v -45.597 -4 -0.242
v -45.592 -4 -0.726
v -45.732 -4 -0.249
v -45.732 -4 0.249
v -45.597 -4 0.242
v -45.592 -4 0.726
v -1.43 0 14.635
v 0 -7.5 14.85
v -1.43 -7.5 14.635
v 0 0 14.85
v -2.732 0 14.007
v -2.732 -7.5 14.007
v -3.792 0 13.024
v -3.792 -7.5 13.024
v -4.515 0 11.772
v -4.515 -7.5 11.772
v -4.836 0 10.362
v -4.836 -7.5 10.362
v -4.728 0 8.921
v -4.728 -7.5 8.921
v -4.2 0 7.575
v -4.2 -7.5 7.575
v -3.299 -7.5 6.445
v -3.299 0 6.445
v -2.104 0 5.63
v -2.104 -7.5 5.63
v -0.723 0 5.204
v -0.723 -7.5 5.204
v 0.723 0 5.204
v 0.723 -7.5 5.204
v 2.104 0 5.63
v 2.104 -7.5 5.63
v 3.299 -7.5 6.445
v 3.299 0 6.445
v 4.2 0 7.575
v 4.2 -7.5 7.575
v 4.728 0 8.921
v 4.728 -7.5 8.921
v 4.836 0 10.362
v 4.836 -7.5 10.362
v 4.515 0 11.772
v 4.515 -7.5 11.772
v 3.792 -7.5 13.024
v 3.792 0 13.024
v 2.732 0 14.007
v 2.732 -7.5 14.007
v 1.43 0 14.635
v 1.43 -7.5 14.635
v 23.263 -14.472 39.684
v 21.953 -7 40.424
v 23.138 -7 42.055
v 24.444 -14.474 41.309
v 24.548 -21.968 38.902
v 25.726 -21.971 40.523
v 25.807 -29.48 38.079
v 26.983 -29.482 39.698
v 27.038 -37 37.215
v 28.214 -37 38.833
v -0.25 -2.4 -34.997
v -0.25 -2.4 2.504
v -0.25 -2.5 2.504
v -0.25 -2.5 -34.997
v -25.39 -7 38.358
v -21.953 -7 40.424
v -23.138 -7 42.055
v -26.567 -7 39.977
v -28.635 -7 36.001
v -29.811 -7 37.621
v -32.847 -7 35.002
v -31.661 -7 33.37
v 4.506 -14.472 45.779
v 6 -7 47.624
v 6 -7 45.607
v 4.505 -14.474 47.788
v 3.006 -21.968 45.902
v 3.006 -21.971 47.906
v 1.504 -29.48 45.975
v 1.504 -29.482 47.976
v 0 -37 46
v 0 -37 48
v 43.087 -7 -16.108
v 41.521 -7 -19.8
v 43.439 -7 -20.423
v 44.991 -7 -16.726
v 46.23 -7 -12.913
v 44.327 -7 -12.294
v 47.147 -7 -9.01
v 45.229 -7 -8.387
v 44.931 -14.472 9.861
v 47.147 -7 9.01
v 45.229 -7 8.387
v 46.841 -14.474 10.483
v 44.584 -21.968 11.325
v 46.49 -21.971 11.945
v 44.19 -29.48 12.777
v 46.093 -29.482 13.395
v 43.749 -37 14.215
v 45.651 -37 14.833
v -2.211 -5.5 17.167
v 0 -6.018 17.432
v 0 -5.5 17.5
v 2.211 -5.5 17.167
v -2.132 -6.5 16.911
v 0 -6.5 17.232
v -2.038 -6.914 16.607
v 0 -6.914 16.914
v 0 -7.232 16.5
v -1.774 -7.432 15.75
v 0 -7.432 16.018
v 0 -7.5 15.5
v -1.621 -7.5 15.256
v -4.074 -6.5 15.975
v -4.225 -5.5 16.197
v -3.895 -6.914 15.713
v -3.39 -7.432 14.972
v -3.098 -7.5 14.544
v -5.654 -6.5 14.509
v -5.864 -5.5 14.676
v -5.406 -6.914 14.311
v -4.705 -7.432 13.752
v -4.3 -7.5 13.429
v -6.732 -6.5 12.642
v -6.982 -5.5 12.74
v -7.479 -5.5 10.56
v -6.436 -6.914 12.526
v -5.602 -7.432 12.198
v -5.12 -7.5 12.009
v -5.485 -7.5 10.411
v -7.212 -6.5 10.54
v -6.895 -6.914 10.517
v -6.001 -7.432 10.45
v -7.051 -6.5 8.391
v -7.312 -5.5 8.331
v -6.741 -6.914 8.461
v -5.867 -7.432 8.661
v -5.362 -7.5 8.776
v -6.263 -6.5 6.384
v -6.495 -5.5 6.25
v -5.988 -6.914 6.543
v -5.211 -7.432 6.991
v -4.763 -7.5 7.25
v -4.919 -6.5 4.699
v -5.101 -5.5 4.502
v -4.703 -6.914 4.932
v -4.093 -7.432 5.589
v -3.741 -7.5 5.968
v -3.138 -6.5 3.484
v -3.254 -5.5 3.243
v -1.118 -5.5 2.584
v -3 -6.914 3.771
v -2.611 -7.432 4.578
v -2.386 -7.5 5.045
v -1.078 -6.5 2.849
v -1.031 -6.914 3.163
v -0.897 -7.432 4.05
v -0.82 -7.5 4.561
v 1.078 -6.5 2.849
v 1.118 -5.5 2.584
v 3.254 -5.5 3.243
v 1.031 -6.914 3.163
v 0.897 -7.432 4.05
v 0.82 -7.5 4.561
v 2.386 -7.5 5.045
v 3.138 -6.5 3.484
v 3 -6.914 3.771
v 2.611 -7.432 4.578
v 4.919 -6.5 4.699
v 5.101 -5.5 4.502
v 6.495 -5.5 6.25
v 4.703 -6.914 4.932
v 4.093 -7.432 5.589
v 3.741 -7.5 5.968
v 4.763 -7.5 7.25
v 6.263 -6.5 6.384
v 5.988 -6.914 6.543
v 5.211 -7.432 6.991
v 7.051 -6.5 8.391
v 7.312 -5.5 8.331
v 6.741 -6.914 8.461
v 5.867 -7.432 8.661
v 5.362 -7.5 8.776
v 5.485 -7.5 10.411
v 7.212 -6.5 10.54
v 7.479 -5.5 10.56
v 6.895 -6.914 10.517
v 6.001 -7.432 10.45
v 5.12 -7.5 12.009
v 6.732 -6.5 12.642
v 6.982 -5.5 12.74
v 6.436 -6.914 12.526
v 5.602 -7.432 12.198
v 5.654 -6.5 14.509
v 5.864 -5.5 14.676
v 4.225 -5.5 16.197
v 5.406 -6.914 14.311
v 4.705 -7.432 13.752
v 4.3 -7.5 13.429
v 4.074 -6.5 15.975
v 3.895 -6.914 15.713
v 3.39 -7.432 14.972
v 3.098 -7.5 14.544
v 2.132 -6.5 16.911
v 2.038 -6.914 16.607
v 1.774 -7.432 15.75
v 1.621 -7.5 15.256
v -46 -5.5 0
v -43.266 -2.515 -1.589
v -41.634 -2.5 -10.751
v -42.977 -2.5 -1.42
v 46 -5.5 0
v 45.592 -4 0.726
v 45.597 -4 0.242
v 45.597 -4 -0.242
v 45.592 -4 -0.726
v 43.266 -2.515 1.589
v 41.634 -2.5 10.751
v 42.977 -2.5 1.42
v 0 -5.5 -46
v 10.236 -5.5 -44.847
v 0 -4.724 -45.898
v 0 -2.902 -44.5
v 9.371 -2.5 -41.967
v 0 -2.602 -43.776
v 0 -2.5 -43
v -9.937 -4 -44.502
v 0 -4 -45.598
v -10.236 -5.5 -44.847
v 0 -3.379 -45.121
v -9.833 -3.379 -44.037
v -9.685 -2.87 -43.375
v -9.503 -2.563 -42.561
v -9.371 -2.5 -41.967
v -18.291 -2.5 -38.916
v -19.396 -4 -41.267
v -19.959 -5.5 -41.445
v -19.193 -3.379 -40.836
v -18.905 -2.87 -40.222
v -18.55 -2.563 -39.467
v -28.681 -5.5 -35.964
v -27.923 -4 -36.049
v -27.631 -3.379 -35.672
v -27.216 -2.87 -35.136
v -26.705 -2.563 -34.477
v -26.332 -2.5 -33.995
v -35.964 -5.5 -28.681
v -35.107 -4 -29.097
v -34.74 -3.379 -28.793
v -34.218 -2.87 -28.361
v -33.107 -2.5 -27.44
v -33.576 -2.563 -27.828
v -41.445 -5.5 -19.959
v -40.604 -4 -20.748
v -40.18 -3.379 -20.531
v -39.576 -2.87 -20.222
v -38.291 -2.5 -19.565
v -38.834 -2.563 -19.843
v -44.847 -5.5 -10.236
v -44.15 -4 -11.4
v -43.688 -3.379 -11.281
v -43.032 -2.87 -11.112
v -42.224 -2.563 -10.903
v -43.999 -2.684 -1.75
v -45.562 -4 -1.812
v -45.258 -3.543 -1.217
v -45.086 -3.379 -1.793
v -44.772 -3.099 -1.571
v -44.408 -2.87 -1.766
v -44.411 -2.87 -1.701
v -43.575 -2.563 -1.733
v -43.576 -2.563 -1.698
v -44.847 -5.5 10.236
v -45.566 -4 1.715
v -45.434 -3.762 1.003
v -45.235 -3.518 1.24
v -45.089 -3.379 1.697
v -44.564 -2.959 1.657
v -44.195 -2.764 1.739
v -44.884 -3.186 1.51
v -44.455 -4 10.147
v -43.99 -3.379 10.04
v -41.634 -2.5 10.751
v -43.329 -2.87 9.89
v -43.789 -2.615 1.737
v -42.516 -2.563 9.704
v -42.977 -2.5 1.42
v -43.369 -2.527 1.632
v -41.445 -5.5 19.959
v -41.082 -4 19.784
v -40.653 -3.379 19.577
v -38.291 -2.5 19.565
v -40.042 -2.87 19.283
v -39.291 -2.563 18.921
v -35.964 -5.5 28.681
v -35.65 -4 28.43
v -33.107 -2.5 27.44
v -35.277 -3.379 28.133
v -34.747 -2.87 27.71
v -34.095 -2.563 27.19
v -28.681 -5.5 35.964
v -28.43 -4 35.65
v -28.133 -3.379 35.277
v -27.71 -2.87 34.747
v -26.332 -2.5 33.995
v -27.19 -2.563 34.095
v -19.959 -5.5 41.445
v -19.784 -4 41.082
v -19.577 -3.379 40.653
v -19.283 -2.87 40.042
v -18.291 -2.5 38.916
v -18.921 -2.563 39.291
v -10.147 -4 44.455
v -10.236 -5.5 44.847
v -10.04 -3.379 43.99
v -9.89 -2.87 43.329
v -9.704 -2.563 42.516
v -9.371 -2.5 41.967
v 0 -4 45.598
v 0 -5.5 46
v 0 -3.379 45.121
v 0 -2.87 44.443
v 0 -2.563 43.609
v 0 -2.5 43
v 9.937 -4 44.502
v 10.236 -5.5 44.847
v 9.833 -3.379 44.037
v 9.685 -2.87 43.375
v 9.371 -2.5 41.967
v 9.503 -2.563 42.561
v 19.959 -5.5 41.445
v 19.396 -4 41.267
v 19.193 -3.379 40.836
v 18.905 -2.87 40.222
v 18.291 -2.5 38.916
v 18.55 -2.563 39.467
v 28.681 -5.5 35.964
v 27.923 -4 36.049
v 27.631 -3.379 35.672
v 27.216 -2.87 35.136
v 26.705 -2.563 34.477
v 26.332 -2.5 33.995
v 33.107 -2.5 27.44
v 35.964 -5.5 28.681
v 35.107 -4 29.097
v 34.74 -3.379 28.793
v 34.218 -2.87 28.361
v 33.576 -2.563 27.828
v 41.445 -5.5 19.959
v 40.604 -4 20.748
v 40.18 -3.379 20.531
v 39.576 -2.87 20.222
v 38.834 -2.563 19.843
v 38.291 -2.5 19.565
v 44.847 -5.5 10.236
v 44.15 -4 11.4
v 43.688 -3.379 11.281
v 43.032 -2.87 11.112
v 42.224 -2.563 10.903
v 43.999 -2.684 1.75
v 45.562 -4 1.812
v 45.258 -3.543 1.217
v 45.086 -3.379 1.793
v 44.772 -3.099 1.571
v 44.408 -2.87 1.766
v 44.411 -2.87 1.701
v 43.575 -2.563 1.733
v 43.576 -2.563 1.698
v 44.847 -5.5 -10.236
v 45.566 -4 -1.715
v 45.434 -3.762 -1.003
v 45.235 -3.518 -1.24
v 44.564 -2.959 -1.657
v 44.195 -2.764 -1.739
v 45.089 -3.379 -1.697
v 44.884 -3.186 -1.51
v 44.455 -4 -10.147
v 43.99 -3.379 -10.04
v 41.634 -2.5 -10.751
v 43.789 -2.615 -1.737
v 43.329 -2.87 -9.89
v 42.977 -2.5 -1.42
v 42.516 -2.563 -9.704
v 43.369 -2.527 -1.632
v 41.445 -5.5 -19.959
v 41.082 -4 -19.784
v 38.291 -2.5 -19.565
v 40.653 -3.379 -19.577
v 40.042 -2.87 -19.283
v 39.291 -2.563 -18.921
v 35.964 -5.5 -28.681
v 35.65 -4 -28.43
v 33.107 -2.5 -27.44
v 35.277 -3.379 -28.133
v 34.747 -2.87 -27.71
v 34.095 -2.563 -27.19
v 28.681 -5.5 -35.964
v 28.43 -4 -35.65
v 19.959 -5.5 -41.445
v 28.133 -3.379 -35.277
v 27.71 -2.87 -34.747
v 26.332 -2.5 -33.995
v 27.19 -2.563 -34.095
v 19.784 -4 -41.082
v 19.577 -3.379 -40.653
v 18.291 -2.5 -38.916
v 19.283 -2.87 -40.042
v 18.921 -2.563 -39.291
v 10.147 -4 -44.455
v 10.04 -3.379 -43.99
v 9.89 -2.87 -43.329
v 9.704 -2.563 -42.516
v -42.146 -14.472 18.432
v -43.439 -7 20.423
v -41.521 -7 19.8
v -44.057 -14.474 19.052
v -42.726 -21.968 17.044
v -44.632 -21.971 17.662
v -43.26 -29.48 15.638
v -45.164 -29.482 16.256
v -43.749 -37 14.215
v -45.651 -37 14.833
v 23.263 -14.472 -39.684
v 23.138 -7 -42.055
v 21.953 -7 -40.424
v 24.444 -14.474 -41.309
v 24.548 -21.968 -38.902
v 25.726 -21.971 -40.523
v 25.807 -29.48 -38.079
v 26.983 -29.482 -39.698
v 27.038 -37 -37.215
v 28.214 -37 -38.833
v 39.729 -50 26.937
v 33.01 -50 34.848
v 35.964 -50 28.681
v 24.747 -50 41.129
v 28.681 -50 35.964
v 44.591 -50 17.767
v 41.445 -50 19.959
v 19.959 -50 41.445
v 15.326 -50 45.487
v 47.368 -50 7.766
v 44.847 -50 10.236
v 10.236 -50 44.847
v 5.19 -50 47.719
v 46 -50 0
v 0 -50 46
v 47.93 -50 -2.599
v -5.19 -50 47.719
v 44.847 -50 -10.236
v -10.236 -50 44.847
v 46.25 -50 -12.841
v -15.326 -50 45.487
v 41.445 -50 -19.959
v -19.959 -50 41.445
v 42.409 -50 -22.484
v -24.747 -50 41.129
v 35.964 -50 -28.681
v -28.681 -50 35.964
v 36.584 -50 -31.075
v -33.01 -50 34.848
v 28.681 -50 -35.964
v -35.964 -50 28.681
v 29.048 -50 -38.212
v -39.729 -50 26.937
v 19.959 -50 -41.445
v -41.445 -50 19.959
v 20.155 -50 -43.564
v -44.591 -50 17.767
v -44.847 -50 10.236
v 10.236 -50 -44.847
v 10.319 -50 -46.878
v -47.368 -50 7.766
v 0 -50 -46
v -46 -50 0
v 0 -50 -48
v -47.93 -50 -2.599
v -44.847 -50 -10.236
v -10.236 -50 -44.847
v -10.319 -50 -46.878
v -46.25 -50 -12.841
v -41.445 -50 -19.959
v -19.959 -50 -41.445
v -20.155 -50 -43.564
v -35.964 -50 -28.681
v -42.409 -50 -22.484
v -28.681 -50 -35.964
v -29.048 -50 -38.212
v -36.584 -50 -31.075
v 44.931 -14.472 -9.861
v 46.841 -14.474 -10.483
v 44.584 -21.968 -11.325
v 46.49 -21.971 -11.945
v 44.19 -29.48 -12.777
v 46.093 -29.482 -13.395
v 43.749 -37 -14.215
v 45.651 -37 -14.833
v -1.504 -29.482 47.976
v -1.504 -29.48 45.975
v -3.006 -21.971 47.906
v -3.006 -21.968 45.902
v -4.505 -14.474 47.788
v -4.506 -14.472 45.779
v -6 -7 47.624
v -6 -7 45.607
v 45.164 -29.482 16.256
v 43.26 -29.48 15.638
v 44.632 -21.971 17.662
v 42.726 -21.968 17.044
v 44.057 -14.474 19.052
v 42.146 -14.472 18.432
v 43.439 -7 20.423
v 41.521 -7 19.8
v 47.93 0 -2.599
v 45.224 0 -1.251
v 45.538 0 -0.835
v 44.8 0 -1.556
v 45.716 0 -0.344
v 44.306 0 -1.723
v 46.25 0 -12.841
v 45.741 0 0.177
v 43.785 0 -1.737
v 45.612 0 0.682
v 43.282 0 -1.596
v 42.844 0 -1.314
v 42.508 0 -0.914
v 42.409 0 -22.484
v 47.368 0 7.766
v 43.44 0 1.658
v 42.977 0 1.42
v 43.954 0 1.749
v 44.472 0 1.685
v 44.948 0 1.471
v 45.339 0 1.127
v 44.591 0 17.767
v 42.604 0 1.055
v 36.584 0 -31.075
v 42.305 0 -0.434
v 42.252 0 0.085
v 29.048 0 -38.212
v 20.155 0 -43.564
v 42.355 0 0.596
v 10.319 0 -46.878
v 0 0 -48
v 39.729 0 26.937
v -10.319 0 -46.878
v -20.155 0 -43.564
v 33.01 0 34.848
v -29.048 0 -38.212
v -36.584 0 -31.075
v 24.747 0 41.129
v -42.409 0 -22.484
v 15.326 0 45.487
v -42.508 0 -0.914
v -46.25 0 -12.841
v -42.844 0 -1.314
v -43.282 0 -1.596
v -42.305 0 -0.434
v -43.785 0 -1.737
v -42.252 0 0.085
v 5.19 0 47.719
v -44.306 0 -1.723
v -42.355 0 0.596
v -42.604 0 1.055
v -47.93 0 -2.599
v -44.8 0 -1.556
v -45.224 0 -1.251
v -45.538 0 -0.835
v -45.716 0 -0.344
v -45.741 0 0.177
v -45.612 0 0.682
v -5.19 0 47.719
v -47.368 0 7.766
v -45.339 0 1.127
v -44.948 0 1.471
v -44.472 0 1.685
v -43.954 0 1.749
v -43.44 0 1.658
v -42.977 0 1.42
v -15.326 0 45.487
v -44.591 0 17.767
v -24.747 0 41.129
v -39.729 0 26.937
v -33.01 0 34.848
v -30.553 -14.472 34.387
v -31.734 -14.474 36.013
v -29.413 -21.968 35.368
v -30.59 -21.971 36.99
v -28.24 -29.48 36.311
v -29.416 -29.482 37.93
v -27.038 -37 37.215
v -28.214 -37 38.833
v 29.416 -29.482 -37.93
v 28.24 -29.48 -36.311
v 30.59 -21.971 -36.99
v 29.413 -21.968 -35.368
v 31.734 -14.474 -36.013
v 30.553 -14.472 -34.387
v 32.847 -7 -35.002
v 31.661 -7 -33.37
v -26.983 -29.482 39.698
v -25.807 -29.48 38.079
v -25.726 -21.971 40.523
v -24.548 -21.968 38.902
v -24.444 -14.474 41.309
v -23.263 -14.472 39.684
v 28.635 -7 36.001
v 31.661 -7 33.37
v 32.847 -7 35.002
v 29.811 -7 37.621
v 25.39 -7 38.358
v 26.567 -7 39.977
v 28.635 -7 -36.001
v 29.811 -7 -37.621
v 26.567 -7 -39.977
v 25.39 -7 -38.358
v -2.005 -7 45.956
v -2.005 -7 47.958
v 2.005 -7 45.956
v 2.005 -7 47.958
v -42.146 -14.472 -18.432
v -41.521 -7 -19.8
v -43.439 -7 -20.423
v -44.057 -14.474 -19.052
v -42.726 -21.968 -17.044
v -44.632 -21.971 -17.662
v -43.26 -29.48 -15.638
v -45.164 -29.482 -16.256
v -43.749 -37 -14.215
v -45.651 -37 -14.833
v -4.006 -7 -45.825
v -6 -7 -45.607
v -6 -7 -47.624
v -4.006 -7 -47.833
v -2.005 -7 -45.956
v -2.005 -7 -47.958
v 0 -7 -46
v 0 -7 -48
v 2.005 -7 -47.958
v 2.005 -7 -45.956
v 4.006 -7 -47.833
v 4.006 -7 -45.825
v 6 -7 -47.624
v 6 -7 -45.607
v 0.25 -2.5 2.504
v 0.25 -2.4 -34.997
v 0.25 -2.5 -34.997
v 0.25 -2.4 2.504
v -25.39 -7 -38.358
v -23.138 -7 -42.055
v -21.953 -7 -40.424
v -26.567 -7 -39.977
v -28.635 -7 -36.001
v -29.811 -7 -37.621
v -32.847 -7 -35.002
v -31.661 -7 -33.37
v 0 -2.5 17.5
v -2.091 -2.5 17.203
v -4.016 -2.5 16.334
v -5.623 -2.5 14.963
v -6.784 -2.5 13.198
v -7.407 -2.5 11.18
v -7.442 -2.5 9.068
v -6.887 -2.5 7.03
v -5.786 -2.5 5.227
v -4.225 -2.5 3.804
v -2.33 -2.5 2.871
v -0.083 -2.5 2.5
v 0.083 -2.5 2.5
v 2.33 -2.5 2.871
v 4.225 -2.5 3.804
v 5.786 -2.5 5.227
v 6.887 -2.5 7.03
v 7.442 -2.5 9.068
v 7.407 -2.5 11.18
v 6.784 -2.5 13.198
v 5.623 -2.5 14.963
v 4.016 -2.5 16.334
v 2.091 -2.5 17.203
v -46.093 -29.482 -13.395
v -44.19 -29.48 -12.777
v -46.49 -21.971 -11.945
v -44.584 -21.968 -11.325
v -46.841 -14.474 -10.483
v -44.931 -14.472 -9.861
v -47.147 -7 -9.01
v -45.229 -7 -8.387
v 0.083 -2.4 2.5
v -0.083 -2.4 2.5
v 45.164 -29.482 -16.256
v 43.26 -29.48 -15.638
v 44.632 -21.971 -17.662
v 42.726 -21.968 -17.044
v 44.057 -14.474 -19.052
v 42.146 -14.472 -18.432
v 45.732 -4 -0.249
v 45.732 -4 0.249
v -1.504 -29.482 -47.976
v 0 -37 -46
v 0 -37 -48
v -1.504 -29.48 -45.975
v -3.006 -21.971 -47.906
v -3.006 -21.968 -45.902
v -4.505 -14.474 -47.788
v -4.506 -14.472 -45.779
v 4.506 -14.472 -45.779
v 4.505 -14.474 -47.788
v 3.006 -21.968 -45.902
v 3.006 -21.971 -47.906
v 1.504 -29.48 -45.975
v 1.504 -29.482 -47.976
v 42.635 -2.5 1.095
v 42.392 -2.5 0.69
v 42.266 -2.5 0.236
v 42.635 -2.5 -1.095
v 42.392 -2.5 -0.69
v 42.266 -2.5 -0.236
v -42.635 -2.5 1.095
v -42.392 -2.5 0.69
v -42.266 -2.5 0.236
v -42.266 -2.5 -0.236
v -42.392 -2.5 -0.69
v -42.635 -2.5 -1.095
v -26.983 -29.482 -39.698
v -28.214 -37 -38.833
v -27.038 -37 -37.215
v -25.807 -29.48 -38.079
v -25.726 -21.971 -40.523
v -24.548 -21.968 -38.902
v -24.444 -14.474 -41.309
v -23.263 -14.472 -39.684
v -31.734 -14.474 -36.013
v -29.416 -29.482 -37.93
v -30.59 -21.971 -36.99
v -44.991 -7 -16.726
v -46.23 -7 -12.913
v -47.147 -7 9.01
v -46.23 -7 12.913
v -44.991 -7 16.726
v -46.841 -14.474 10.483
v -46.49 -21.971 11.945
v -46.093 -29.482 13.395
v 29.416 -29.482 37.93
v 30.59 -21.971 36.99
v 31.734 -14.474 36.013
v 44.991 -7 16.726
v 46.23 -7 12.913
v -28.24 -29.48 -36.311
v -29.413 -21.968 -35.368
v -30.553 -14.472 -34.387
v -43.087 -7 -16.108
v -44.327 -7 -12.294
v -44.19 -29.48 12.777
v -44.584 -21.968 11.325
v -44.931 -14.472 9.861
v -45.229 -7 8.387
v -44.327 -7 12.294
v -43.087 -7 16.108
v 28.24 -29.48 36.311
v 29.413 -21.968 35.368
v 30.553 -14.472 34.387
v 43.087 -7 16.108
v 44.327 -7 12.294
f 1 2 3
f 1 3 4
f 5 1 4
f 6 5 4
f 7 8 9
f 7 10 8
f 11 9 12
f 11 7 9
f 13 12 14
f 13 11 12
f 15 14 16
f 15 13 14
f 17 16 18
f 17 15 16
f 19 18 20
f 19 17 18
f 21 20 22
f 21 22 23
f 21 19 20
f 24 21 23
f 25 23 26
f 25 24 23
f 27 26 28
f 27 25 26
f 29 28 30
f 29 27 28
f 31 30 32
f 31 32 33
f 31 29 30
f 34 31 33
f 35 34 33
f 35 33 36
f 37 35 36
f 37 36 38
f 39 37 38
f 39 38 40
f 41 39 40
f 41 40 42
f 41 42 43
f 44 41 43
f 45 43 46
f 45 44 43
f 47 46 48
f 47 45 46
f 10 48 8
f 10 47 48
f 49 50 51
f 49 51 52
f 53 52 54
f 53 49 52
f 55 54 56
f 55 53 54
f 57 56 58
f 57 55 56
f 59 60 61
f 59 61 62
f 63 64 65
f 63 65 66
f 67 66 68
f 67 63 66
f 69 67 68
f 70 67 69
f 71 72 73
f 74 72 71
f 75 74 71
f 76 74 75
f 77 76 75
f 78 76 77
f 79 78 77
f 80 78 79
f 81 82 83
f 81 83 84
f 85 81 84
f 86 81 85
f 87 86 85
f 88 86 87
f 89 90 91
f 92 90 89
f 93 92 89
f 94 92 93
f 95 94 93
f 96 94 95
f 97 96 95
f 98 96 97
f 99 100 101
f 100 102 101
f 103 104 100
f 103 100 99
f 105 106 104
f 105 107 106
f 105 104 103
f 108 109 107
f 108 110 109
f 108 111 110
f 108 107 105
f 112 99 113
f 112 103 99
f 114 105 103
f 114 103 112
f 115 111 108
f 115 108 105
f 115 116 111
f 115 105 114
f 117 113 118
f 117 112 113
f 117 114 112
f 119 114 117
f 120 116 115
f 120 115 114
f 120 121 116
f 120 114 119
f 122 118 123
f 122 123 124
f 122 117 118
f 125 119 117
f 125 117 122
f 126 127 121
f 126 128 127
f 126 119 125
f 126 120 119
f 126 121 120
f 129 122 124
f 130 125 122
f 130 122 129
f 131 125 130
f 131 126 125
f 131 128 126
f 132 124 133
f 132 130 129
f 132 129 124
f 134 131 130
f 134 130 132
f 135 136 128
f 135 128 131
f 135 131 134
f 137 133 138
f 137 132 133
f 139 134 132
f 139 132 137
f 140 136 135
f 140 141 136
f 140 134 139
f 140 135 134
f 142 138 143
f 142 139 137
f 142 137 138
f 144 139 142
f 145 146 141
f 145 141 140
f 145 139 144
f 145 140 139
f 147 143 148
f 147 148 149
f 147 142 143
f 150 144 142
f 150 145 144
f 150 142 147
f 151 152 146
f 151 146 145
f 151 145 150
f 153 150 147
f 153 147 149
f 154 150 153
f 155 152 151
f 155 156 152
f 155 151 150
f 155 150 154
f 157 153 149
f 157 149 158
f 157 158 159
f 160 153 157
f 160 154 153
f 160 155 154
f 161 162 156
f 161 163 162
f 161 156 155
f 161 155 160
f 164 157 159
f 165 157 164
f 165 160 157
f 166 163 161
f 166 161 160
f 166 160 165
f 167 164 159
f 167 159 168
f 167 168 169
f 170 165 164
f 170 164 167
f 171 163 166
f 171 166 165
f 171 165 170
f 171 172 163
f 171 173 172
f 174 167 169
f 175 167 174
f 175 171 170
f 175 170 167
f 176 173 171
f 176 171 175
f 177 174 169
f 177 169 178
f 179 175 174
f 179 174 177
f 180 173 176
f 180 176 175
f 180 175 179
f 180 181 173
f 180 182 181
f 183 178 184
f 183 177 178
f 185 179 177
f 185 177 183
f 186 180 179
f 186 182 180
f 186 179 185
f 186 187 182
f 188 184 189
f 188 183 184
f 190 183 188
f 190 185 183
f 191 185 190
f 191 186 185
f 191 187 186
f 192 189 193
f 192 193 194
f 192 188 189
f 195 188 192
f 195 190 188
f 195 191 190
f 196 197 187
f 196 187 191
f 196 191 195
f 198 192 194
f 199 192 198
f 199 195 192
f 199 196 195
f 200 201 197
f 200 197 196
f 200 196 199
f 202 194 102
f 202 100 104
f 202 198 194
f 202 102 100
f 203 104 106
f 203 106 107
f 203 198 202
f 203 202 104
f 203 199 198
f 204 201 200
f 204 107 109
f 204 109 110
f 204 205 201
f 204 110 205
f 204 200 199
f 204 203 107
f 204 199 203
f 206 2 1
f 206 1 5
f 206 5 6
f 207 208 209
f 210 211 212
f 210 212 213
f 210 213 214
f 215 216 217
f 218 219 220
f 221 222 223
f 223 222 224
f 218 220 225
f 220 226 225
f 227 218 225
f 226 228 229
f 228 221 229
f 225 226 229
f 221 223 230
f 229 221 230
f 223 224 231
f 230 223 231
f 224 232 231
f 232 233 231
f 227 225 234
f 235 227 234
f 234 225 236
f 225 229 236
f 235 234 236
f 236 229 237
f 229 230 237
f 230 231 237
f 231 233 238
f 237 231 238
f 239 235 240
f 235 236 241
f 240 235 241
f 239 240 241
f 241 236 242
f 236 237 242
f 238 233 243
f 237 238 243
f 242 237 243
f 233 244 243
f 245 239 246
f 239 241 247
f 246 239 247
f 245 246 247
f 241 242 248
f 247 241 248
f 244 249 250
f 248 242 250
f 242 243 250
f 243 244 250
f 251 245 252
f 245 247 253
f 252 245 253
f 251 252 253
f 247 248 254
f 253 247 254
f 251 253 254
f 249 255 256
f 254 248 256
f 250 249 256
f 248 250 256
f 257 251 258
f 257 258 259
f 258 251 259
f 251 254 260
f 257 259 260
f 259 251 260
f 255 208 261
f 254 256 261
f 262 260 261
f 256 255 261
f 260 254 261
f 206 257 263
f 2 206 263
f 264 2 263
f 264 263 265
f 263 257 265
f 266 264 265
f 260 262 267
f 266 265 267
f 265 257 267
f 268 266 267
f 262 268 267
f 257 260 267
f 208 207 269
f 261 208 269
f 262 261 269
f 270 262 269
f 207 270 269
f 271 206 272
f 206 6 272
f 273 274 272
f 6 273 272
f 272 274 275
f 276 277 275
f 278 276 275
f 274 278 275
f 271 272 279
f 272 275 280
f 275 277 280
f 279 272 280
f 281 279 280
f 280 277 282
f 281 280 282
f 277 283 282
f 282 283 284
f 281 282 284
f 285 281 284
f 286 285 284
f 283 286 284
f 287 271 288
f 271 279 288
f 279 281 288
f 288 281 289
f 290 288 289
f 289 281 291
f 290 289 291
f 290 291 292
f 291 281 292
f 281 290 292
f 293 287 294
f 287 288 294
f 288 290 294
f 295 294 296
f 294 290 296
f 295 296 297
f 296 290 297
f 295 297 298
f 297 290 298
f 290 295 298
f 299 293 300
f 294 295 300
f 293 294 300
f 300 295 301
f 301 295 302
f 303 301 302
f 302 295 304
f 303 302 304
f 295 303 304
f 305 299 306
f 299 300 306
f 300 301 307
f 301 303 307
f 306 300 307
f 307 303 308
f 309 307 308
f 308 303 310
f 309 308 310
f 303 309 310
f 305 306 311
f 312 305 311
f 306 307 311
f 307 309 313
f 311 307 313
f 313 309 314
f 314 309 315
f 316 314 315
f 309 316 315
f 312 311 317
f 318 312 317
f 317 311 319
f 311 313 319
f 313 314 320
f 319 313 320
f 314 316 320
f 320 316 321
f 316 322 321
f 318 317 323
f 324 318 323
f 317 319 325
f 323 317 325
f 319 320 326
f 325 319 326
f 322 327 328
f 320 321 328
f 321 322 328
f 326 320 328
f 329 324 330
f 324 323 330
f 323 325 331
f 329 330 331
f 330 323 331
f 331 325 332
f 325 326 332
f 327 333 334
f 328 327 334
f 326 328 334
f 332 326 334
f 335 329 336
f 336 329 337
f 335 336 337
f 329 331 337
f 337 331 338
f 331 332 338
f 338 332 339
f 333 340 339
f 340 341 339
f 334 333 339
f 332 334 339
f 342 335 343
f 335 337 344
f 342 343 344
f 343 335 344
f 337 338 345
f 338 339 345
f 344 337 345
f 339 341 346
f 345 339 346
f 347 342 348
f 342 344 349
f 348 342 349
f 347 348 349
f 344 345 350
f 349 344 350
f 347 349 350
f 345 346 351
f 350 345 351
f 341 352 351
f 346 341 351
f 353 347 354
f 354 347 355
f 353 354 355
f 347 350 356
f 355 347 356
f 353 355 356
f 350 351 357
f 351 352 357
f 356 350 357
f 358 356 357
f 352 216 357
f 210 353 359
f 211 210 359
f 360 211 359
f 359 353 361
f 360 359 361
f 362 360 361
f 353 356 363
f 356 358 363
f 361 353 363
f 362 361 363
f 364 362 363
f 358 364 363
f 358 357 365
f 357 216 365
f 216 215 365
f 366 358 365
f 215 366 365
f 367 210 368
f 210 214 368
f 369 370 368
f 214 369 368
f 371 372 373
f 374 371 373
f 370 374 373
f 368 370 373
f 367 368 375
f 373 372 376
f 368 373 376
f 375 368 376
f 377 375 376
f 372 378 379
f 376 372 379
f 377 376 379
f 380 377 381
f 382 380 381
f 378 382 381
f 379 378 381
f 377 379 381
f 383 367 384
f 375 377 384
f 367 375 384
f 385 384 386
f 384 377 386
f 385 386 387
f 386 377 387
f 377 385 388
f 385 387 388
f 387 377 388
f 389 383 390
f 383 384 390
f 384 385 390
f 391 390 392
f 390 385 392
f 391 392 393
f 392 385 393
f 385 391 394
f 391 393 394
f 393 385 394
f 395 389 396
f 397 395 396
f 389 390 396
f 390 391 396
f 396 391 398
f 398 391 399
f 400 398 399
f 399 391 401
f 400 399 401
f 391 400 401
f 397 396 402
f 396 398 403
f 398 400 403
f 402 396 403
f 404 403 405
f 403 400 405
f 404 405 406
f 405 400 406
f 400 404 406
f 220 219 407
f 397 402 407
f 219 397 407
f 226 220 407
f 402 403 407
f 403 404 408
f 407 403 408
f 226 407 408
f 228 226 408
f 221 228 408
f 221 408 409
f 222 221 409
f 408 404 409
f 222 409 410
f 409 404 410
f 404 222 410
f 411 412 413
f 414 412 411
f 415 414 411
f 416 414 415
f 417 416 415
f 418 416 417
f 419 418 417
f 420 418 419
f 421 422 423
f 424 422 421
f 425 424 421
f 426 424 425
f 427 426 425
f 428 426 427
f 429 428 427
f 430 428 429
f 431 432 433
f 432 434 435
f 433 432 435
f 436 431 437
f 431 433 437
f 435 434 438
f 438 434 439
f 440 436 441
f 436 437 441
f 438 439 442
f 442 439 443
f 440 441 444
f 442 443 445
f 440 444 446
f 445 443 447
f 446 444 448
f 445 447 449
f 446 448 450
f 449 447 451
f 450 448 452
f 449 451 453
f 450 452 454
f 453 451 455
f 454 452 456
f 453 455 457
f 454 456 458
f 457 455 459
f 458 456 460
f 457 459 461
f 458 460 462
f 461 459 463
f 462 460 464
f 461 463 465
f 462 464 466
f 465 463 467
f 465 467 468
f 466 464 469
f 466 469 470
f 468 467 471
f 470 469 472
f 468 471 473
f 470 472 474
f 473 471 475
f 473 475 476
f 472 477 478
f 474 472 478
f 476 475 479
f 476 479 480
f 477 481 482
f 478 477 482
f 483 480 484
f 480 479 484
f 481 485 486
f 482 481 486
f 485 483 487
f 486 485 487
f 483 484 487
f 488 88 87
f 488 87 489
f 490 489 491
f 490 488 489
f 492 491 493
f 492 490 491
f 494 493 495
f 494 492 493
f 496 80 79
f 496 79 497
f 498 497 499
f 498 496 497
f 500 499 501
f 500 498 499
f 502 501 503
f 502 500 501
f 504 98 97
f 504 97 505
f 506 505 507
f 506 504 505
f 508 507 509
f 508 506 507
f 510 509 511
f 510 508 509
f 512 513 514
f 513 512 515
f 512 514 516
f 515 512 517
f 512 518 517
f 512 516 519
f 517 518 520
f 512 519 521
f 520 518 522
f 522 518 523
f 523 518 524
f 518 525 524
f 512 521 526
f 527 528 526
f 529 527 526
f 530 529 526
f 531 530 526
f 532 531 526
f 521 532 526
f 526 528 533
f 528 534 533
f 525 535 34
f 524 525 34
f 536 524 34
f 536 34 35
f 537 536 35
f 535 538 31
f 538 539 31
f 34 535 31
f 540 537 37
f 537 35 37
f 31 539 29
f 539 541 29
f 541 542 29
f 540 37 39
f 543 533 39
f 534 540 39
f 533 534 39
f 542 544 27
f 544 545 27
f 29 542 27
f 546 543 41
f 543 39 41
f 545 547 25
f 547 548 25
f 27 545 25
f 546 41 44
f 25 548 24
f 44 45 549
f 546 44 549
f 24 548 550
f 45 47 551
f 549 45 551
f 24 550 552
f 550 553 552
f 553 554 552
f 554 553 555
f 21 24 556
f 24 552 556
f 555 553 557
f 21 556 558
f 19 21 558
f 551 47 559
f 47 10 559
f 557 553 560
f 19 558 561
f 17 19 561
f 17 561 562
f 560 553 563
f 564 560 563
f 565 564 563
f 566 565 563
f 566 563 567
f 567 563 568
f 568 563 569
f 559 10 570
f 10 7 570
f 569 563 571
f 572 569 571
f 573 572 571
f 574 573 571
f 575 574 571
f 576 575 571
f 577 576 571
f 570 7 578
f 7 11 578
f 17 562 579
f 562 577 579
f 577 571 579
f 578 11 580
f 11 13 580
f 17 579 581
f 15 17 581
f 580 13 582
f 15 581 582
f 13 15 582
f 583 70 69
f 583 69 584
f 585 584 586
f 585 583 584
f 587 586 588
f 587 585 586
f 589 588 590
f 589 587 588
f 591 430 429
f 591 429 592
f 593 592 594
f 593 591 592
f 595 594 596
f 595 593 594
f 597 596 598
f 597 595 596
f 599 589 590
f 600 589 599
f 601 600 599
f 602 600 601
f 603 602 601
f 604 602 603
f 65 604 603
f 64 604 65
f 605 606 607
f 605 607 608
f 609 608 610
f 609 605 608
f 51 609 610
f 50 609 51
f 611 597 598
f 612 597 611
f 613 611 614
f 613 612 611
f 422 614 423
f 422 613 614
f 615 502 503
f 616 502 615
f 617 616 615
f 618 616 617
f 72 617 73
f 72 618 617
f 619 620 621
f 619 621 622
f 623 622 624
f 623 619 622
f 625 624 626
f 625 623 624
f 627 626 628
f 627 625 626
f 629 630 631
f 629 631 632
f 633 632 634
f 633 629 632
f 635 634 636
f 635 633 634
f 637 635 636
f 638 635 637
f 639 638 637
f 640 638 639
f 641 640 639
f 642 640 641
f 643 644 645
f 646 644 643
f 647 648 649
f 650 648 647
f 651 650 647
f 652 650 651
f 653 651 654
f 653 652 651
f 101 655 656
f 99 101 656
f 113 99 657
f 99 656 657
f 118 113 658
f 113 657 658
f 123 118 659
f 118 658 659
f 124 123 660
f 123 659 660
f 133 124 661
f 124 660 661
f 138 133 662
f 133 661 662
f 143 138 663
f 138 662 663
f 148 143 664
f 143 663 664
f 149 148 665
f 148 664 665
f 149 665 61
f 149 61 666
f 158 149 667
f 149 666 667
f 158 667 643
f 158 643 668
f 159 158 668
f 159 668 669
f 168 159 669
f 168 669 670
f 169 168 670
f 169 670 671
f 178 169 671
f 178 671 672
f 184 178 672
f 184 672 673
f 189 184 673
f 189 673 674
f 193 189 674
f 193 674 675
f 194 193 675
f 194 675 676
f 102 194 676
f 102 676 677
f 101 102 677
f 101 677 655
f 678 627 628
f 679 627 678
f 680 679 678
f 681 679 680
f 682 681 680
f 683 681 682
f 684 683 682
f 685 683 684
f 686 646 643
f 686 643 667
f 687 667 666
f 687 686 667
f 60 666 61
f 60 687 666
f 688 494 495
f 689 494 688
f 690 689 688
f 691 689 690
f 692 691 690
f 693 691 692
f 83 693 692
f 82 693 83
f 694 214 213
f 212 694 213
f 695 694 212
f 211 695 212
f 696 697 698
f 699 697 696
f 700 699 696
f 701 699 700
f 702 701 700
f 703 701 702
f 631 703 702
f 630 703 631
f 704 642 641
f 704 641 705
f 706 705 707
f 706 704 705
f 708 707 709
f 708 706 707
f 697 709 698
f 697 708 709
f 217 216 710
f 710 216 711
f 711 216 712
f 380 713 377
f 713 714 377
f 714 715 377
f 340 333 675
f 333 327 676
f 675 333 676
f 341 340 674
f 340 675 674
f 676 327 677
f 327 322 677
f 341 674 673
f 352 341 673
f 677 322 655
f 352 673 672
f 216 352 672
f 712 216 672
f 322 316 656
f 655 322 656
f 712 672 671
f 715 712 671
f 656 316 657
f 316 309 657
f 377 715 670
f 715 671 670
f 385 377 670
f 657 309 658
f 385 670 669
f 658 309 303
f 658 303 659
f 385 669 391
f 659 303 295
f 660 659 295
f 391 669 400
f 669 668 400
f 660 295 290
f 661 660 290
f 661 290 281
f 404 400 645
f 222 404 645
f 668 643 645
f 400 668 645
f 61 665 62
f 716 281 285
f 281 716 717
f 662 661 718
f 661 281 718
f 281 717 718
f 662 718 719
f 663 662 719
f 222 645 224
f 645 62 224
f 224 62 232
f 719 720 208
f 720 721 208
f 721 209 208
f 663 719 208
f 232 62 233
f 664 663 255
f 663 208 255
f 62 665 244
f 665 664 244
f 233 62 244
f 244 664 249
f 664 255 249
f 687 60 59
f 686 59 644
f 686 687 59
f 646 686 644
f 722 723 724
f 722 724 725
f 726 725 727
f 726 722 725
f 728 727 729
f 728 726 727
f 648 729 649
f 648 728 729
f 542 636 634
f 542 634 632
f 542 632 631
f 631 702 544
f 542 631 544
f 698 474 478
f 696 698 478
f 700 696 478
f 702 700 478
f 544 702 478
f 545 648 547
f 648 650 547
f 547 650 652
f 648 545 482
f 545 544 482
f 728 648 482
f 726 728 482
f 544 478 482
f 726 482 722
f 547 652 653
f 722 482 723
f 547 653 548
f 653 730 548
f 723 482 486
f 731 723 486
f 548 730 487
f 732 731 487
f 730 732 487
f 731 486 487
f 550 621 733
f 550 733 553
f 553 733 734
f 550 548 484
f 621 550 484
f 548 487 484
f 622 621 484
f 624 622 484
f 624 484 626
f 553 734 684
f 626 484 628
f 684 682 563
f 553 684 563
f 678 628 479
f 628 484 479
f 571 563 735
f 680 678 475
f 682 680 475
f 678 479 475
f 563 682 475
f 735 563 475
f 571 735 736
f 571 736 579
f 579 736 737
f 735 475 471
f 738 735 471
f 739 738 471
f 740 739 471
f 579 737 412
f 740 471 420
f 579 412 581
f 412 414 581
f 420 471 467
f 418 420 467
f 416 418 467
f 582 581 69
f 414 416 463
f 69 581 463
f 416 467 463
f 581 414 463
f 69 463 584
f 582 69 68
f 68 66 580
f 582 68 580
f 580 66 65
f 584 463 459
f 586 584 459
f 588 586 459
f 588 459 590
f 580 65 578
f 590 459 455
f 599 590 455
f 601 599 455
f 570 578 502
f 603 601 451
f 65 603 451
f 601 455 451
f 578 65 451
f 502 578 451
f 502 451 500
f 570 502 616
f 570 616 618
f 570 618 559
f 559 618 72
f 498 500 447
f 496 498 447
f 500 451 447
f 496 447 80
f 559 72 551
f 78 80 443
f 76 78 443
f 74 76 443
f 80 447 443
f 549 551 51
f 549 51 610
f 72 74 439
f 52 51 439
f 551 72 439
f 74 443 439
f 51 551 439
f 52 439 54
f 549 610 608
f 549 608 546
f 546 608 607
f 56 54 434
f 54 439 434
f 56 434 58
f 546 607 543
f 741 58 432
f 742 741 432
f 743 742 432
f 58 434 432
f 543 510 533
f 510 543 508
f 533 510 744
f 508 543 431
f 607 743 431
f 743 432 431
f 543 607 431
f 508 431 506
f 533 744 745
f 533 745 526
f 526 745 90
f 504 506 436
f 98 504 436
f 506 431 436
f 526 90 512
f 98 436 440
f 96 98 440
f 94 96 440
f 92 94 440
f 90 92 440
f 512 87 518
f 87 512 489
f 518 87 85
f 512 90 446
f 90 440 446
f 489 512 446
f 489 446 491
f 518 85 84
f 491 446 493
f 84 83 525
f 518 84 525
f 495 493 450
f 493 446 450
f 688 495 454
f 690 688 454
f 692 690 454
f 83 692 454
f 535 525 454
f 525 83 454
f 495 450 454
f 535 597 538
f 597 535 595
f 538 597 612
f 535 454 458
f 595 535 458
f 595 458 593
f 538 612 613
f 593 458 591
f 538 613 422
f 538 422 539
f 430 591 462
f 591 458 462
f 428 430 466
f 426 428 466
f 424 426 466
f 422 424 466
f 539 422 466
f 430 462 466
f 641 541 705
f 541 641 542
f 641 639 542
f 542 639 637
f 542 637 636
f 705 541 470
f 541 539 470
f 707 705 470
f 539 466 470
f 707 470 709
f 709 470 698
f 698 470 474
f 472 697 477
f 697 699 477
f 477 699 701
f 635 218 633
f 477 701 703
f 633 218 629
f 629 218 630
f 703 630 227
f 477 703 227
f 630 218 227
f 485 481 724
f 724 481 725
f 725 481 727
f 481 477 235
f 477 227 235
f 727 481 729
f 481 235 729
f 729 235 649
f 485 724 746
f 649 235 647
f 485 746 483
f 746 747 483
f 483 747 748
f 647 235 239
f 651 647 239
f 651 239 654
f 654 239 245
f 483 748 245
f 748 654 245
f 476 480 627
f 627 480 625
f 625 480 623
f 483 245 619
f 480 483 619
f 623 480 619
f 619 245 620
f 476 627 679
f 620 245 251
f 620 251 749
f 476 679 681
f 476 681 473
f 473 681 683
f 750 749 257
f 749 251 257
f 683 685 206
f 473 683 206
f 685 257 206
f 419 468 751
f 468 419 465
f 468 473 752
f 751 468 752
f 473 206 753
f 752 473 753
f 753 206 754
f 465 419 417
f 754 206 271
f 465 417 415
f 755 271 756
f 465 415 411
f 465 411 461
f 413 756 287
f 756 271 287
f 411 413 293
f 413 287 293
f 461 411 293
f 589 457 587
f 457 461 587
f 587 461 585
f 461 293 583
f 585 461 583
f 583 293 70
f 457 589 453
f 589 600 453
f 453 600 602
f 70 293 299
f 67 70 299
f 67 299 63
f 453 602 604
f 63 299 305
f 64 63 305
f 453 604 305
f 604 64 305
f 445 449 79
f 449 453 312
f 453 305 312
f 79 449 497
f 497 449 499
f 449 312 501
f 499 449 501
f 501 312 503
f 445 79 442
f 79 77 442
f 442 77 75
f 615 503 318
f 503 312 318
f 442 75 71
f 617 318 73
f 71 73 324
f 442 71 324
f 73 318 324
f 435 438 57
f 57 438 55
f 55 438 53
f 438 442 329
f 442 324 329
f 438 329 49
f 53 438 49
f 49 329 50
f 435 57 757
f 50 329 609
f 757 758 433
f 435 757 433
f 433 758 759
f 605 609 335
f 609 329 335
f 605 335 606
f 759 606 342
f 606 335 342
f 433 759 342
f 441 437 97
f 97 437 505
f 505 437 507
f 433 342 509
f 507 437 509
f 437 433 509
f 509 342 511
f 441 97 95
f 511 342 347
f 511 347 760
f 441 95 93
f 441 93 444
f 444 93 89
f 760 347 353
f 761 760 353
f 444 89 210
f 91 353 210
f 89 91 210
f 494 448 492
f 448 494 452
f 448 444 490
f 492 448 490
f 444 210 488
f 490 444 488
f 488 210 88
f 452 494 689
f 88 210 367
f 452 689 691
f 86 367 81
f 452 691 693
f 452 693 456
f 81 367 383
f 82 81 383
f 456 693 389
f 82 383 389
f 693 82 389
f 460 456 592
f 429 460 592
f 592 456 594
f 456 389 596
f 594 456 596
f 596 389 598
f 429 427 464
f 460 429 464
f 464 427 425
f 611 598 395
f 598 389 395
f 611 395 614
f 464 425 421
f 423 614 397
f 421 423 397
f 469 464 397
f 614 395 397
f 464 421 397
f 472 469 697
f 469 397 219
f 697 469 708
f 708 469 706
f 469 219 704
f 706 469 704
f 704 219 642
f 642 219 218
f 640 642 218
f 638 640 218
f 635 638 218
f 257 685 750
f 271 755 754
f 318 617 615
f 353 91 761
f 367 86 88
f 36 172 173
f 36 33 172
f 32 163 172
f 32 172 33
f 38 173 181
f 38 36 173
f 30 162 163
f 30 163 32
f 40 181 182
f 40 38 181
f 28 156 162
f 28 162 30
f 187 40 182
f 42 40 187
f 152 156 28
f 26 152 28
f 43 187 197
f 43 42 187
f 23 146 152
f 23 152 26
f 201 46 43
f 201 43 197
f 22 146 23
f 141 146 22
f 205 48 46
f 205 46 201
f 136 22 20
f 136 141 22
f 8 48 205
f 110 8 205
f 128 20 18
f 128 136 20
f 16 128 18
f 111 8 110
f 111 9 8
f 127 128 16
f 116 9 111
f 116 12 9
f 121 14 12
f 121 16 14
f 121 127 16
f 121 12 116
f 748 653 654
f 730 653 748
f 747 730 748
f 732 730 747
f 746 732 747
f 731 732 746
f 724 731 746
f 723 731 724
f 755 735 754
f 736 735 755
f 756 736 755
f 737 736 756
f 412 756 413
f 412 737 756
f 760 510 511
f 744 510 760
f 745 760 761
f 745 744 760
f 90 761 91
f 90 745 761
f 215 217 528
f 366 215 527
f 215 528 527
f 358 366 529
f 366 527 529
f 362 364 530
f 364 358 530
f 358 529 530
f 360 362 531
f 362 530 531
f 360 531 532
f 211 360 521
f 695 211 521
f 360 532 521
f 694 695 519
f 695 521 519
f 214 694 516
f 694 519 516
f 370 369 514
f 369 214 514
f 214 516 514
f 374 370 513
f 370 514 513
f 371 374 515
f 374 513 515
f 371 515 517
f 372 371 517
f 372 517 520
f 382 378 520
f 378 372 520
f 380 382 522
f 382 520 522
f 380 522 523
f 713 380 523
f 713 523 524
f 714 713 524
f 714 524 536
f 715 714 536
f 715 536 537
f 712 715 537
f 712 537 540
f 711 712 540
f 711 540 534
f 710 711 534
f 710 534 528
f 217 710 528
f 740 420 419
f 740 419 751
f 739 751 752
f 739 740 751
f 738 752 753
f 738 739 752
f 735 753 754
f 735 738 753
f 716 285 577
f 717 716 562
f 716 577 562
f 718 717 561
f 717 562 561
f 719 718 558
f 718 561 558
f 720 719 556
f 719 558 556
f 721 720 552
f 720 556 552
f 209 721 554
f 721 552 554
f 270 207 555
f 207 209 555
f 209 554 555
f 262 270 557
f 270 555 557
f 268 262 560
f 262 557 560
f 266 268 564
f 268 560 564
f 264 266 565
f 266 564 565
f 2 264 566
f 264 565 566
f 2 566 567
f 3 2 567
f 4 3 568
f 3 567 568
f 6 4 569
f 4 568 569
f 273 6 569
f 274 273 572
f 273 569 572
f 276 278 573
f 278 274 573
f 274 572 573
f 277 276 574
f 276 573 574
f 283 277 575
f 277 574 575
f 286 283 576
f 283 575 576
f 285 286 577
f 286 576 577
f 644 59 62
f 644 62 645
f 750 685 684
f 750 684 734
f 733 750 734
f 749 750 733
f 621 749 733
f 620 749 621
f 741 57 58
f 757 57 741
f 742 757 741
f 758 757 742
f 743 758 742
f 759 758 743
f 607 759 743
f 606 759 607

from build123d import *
from build123d.topology import SkipClean

# Parameters (mm, degrees)
SKETCH_3_R                 = 4.85
CUT_EXTRUDE_496_DEPTH      = 38.7
CUT_EXTRUDE_713_DEPTH      = 70.85
PATTERN_CIRCULAR_762_COUNT = 5
SKETCH_5_R                 = 7.5
SKETCH_5_R_2               = 4.85
EXTRUDE_884_DEPTH          = 5
CUT_EXTRUDE_START          = -0.1
CUT_EXTRUDE_1190_DEPTH     = 0.1
FILLET_2_R                 = 2
SKETCH_7_R                 = 1.75
CUT_EXTRUDE_1_DEPTH        = 4


with BuildPart() as part:
    # Эскиз2 → Revolve 372 (revolve)
    with BuildSketch(Plane.XY, mode=Mode.PRIVATE) as revolve_372_sk:
        with BuildLine():
            Line((0, 0), (-48, 0))
            Line((-48, 0), (-48, -50))
            Line((-48, -50), (-46, -50))
            Line((-46, -50), (-46, -5.5))
            ThreePointArc((-46, -5.5), (-45.121320344, -3.378679656), (-43, -2.5))
            Line((-43, -2.5), (0, -2.5))
            Line((0, -2.5), (0, 0))
        make_face()
    revolve(revolve_372_sk.sketch.rotate(Axis((0, 0, 0), (0, 1, 0)), 270), axis=Axis((0, 0, 0), (0, 1, 0)))

    # Эскиз3 → Cut-Extrude 496 (cut)
    with BuildSketch(Plane(origin=(0, 0, 0), x_dir=(1, 0, 0), z_dir=(0, 1, 0))):
        with Locations(Location((0, -10, 0), (0, 0, 270))):
            Circle(SKETCH_3_R)
    extrude(amount=-CUT_EXTRUDE_496_DEPTH, mode=Mode.SUBTRACT)

    # Эскиз4 → Cut-Extrude 713 (cut, symmetric)
    with BuildSketch(Plane.XY):
        Polygon((-6, -7), (6, -7), (0, -37), align=None)
    cut_extrude_713 = extrude(amount=CUT_EXTRUDE_713_DEPTH, both=True, mode=Mode.SUBTRACT)

    # Pattern Circular 762: Cut-Extrude 713 ×5 about axis
    pattern_circular_762_axis = Axis((0, 0, 0), (0, 1, 0))
    for i in range(1, PATTERN_CIRCULAR_762_COUNT):
        add(cut_extrude_713.rotate(pattern_circular_762_axis, i * 360 / PATTERN_CIRCULAR_762_COUNT), mode=Mode.SUBTRACT)

    # Эскиз5 → Extrude 884 (add)
    with BuildSketch(Plane.XZ.offset(2.5)):
        with Locations(Location((0, 10, 0), (0, 0, 90))):
            Circle(SKETCH_5_R)
        with Locations(Location((0, 10, 0), (0, 0, 90))):
            Circle(SKETCH_5_R_2, mode=Mode.SUBTRACT)
    extrude(amount=EXTRUDE_884_DEPTH)

    # Эскиз6 → Cut-Extrude 1190 (cut)
    with SkipClean():  # the faces are left unmerged after this step: merging them gives an invalid solid
        with BuildSketch(Plane.XZ.offset(2.5).offset(CUT_EXTRUDE_START)):
            with BuildLine():
                Line((-0.25, 2.504167825), (-0.25, -34.997321394))
                Line((-0.25, -34.997321394), (0.25, -34.997321394))
                Line((0.25, -34.997321394), (0.25, 2.504167825))
                ThreePointArc((0.25, 2.504167825), (0, 2.5), (-0.25, 2.504167825))
            make_face()
        extrude(amount=CUT_EXTRUDE_1190_DEPTH, mode=Mode.SUBTRACT)

    # Скругление2
    fillet_2_edges = [part.edges().sort_by_distance(p)[0] for p in [
        (0, -7.5, 2.5),
    ]]
    fillet(fillet_2_edges, radius=FILLET_2_R)

    # Эскиз7 → Вырез-Вытянуть1 (cut, symmetric)
    with SkipClean():  # the faces are left unmerged after this step: merging them gives an invalid solid
        with BuildSketch(Plane(origin=(0, 0, 0), x_dir=(1, 0, 0), z_dir=(0, 1, 0))):
            with Locations(Location((44, 0, 0), (0, 0, 234.209624239))):
                Circle(SKETCH_7_R)
            with Locations(Location((-44, 0, 0), (0, 0, 305.790375763))):
                Circle(SKETCH_7_R)
        extrude(amount=CUT_EXTRUDE_1_DEPTH, both=True, mode=Mode.SUBTRACT)


solid = part.part
